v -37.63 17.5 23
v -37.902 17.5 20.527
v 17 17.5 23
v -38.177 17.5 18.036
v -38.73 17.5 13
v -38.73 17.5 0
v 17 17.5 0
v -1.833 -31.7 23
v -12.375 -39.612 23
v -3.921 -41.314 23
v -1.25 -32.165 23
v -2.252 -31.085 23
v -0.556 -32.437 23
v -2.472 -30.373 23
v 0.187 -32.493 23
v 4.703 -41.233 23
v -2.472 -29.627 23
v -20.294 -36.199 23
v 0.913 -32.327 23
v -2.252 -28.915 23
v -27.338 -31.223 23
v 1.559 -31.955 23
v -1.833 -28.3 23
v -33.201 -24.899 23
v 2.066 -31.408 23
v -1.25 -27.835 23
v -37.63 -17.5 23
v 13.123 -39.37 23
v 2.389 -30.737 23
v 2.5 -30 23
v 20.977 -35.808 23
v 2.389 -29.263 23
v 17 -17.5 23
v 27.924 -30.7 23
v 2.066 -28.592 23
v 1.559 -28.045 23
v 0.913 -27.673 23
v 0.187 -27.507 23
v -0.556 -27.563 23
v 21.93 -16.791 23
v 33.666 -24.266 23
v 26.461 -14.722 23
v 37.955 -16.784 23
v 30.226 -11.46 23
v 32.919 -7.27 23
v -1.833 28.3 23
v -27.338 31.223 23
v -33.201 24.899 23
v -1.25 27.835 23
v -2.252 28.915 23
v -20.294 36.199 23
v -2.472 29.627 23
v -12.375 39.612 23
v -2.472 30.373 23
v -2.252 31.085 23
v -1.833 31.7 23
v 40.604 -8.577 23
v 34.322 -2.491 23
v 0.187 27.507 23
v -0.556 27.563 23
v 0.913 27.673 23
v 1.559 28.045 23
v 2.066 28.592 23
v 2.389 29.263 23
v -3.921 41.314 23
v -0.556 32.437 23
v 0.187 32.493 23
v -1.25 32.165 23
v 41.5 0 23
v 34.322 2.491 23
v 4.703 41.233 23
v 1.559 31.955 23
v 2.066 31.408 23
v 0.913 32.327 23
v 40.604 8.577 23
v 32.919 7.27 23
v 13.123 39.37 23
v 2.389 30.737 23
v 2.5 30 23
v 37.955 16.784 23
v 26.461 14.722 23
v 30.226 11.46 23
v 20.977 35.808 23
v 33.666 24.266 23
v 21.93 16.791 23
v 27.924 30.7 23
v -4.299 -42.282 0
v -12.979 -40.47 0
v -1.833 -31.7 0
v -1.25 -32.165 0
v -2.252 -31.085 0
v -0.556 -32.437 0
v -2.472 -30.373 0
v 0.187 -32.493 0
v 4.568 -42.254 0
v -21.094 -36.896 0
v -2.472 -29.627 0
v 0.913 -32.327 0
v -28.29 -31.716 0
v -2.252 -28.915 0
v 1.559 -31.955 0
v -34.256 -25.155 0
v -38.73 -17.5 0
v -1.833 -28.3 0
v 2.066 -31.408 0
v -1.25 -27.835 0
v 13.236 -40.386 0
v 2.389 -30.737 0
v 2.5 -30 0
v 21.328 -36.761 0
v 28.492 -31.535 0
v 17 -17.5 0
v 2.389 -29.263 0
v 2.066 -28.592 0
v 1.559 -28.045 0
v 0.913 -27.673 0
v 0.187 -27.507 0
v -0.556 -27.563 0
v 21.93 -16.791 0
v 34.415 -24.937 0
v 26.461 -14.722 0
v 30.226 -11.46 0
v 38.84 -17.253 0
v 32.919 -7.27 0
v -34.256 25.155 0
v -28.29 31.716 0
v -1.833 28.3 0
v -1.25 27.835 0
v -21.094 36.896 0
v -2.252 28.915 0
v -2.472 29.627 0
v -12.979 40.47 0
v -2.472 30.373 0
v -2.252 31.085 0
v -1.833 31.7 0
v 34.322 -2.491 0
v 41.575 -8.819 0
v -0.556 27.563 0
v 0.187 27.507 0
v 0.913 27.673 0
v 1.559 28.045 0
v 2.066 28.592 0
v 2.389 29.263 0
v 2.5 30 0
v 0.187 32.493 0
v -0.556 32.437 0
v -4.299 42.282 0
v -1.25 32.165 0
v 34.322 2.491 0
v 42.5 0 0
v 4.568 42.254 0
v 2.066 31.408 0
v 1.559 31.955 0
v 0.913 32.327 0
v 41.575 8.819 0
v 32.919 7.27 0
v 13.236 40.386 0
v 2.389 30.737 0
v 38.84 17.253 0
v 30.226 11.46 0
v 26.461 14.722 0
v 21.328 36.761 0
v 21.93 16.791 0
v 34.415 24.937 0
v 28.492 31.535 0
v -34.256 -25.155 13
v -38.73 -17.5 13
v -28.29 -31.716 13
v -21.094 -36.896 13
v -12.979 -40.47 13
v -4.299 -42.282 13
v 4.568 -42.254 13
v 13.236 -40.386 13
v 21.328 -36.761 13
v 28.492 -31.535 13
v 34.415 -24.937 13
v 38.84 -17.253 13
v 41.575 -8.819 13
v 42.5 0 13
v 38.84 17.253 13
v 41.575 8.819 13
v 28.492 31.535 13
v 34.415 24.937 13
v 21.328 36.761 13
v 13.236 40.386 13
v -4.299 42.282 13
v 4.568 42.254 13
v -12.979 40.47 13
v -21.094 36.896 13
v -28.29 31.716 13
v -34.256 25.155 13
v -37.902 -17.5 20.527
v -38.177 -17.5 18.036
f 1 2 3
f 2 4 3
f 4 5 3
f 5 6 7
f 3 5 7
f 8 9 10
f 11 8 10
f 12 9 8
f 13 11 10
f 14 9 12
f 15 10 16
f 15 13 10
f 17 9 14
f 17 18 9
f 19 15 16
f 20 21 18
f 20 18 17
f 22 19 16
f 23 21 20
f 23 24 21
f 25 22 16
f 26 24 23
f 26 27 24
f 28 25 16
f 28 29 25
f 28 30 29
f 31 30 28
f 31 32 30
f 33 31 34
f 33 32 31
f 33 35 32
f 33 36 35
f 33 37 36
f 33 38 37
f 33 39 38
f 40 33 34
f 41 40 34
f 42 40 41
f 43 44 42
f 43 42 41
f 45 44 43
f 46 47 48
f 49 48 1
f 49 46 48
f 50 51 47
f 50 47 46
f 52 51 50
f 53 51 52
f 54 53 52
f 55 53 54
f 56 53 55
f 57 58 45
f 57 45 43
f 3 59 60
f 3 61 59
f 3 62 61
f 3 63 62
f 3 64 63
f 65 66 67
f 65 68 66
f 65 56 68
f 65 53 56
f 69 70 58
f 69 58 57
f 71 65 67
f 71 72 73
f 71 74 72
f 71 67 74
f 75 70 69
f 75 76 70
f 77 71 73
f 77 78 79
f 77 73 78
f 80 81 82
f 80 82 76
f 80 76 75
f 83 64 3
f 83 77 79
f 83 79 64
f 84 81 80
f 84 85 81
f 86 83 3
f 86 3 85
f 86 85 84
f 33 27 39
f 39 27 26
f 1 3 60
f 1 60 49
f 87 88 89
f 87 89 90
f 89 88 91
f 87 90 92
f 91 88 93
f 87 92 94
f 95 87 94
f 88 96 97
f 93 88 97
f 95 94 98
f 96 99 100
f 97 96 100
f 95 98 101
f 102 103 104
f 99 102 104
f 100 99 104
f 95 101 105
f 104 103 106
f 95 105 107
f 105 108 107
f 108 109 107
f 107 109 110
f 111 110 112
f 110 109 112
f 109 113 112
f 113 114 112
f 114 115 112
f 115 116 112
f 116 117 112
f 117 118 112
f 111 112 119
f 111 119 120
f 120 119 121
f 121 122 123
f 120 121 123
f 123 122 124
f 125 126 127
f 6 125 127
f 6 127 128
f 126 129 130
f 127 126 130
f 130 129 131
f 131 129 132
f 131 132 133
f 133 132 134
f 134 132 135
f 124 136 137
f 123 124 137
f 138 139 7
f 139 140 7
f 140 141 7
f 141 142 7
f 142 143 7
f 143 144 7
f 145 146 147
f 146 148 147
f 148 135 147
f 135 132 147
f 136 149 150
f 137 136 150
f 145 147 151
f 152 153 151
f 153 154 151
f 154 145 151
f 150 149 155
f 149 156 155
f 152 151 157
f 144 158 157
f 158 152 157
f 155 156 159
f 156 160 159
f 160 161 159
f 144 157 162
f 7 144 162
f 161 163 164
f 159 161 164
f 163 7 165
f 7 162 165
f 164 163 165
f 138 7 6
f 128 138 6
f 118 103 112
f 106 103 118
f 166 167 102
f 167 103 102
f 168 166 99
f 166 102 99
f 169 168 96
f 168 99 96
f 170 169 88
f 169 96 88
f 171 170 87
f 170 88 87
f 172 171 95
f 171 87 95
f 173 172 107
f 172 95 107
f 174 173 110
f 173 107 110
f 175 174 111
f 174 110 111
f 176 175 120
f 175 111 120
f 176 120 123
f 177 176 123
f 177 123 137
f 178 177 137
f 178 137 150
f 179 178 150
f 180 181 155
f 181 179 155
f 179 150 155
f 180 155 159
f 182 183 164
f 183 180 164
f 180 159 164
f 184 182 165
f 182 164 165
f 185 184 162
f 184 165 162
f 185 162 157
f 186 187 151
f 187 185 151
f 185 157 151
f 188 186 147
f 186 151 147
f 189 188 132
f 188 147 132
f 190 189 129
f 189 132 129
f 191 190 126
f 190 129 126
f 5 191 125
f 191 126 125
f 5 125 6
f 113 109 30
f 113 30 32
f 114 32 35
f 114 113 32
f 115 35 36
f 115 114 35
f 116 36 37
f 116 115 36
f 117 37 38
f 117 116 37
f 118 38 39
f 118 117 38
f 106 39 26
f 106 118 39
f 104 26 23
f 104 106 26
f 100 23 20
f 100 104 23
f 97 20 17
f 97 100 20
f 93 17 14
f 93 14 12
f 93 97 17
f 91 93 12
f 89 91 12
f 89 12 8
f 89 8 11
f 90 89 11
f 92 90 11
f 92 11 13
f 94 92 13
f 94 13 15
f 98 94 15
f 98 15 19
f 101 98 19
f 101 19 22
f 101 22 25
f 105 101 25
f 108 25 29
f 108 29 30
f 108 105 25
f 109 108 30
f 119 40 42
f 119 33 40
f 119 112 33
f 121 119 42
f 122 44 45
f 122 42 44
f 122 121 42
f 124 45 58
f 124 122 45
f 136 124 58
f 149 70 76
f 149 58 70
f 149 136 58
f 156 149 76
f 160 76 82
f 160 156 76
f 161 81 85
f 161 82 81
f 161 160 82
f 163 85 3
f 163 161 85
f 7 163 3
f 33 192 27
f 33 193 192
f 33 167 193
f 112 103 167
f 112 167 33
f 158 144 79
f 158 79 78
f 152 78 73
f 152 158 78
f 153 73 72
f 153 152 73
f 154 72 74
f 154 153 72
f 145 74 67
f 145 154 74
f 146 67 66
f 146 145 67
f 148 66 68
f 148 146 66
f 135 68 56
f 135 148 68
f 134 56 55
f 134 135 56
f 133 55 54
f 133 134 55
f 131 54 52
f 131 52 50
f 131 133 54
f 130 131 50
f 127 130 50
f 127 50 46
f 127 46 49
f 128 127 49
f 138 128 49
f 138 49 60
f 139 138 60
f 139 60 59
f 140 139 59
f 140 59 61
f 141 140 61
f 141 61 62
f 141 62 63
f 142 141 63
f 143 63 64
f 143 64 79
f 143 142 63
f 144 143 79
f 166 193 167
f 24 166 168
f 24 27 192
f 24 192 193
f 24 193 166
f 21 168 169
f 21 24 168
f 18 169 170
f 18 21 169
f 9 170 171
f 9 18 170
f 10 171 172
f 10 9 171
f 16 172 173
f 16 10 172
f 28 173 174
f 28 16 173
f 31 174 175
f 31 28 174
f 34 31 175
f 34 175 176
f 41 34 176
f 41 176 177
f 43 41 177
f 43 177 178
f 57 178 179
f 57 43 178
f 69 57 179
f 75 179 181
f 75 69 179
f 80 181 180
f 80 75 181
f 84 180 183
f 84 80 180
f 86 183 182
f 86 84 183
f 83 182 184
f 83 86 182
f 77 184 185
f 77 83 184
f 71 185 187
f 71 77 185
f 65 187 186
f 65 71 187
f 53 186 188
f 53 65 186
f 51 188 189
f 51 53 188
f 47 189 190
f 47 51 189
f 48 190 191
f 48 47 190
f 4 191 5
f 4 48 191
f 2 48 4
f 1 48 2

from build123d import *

# Parameters (mm, degrees)
CYLINDER003_R     = 2.5
CYLINDER003_DEPTH = 23
CYLINDER002_R     = 2.5
CYLINDER002_DEPTH = 23
BOX_W             = 59.5
BOX_H             = 35
BOX_DEPTH         = 23
CYLINDER001_R     = 17.5
CYLINDER001_DEPTH = 23
CYLINDER_R        = 42.5
CYLINDER_DEPTH    = 23
CHAMFER_SIZE2     = 1
CHAMFER_SIZE      = 10


with BuildPart() as cylinder003:
    # Cylinder003 → Cylinder003 (new body)
    with BuildSketch(Plane(origin=(0, -30, 0), x_dir=(1, 0, 0), z_dir=(0, 0, 1))):
        Circle(CYLINDER003_R)
    extrude(amount=CYLINDER003_DEPTH)


with BuildPart() as cylinder002:
    # Cylinder002 → Cylinder002 (new body)
    with BuildSketch(Plane(origin=(0, 30, 0), x_dir=(1, 0, 0), z_dir=(0, 0, 1))):
        Circle(CYLINDER002_R)
    extrude(amount=CYLINDER002_DEPTH)


with BuildPart() as cube:
    # Box → Box (new body)
    with BuildSketch(Plane(origin=(-42.5, -17.5, 0), x_dir=(1, 0, 0), z_dir=(0, 0, 1))):
        with Locations((29.75, 17.5)):
            Rectangle(BOX_W, BOX_H)
    extrude(amount=BOX_DEPTH)


with BuildPart() as cylinder001:
    # Cylinder001 → Cylinder001 (new body)
    with BuildSketch(Plane(origin=(17, 0, 0), x_dir=(1, 0, 0), z_dir=(0, 0, 1))):
        Circle(CYLINDER001_R)
    extrude(amount=CYLINDER001_DEPTH)


with BuildPart() as cut003:
    # Cylinder → Cylinder (new body)
    with BuildSketch(Plane.XY):
        Circle(CYLINDER_R)
    extrude(amount=CYLINDER_DEPTH)

    # Chamfer
    chamfer_edges = [cut003.edges().sort_by_distance(p)[0] for p in [
        (-42.5, 0, 23),
    ]]
    chamfer_side = cut003.faces().sort_by_distance((-42.5, 0, 11.5))[0]
    chamfer(chamfer_edges, length=CHAMFER_SIZE, length2=CHAMFER_SIZE2, reference=chamfer_side)

    # Cut: cut Cylinder001
    add(cylinder001.part, mode=Mode.SUBTRACT)

    # Cut001: cut Cube
    add(cube.part, mode=Mode.SUBTRACT)

    # Cut002: cut Cylinder002
    add(cylinder002.part, mode=Mode.SUBTRACT)

    # Cut003: cut Cylinder003
    add(cylinder003.part, mode=Mode.SUBTRACT)


solid = cut003.part
